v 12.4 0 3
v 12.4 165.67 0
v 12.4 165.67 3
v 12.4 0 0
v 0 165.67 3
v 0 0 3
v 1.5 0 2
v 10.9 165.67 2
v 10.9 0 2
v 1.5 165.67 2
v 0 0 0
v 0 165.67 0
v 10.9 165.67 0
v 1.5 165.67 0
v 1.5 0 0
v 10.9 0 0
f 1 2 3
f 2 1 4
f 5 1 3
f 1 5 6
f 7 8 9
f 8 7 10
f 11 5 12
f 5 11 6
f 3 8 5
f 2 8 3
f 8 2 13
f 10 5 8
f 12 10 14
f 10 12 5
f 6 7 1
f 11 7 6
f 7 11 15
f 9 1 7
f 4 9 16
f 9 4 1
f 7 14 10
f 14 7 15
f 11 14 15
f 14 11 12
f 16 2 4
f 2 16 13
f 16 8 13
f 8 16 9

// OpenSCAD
// ============================================
// Artemis II LED Tracker - Diffuser Cap
// Print 6x in WHITE PLA
// Bambu Lab A1 Mini (180x180x180mm)
// ============================================
// Settings: 0.2mm layer height, 2 walls, 0% infill
// This gives ~0.8mm wall thickness = great diffusion
// TIP: Enable "fuzzy skin" in Bambu Studio for
//      an even better frosted-glass look
// ============================================

/* [Must match channel_segment.scad values] */
strip_width = 12;
strip_clearance = 0.5;
wall = 2;
total_height = 10;
lip_inset = 1.5;
lip_h = 1.2;
leds_per_seg = 10;
led_pitch = 16.667;

/* [Diffuser Properties] */
diff_thick = 1.0;          // Top surface thickness (mm) - thin = more glow
side_h = 2.0;              // Side tab height (mm) - sits on lips
fit_gap = 0.3;             // Clearance for easy slide-in fit (mm)
end_gap = 0.5;             // Shorten slightly so it slides in easily (mm)

/* [Computed] */
seg_len = leds_per_seg * led_pitch;
inner_w = strip_width + strip_clearance * 2;
cap_w = inner_w - fit_gap * 2;          // Fits between channel walls
cap_len = seg_len - end_gap * 2;        // Slightly shorter than channel
free_span = inner_w - lip_inset * 2;    // Open gap between lips
tab_w = (cap_w - free_span) / 2 + 0.3; // Tab overlap on each lip

module diffuser_cap() {
    // Flat diffuser top
    translate([0, 0, side_h])
        cube([cap_w, cap_len, diff_thick]);

    // Left side tab (rests on lip)
    cube([tab_w, cap_len, side_h + diff_thick]);

    // Right side tab (rests on lip)
    translate([cap_w - tab_w, 0, 0])
        cube([tab_w, cap_len, side_h + diff_thick]);
}

diffuser_cap();
